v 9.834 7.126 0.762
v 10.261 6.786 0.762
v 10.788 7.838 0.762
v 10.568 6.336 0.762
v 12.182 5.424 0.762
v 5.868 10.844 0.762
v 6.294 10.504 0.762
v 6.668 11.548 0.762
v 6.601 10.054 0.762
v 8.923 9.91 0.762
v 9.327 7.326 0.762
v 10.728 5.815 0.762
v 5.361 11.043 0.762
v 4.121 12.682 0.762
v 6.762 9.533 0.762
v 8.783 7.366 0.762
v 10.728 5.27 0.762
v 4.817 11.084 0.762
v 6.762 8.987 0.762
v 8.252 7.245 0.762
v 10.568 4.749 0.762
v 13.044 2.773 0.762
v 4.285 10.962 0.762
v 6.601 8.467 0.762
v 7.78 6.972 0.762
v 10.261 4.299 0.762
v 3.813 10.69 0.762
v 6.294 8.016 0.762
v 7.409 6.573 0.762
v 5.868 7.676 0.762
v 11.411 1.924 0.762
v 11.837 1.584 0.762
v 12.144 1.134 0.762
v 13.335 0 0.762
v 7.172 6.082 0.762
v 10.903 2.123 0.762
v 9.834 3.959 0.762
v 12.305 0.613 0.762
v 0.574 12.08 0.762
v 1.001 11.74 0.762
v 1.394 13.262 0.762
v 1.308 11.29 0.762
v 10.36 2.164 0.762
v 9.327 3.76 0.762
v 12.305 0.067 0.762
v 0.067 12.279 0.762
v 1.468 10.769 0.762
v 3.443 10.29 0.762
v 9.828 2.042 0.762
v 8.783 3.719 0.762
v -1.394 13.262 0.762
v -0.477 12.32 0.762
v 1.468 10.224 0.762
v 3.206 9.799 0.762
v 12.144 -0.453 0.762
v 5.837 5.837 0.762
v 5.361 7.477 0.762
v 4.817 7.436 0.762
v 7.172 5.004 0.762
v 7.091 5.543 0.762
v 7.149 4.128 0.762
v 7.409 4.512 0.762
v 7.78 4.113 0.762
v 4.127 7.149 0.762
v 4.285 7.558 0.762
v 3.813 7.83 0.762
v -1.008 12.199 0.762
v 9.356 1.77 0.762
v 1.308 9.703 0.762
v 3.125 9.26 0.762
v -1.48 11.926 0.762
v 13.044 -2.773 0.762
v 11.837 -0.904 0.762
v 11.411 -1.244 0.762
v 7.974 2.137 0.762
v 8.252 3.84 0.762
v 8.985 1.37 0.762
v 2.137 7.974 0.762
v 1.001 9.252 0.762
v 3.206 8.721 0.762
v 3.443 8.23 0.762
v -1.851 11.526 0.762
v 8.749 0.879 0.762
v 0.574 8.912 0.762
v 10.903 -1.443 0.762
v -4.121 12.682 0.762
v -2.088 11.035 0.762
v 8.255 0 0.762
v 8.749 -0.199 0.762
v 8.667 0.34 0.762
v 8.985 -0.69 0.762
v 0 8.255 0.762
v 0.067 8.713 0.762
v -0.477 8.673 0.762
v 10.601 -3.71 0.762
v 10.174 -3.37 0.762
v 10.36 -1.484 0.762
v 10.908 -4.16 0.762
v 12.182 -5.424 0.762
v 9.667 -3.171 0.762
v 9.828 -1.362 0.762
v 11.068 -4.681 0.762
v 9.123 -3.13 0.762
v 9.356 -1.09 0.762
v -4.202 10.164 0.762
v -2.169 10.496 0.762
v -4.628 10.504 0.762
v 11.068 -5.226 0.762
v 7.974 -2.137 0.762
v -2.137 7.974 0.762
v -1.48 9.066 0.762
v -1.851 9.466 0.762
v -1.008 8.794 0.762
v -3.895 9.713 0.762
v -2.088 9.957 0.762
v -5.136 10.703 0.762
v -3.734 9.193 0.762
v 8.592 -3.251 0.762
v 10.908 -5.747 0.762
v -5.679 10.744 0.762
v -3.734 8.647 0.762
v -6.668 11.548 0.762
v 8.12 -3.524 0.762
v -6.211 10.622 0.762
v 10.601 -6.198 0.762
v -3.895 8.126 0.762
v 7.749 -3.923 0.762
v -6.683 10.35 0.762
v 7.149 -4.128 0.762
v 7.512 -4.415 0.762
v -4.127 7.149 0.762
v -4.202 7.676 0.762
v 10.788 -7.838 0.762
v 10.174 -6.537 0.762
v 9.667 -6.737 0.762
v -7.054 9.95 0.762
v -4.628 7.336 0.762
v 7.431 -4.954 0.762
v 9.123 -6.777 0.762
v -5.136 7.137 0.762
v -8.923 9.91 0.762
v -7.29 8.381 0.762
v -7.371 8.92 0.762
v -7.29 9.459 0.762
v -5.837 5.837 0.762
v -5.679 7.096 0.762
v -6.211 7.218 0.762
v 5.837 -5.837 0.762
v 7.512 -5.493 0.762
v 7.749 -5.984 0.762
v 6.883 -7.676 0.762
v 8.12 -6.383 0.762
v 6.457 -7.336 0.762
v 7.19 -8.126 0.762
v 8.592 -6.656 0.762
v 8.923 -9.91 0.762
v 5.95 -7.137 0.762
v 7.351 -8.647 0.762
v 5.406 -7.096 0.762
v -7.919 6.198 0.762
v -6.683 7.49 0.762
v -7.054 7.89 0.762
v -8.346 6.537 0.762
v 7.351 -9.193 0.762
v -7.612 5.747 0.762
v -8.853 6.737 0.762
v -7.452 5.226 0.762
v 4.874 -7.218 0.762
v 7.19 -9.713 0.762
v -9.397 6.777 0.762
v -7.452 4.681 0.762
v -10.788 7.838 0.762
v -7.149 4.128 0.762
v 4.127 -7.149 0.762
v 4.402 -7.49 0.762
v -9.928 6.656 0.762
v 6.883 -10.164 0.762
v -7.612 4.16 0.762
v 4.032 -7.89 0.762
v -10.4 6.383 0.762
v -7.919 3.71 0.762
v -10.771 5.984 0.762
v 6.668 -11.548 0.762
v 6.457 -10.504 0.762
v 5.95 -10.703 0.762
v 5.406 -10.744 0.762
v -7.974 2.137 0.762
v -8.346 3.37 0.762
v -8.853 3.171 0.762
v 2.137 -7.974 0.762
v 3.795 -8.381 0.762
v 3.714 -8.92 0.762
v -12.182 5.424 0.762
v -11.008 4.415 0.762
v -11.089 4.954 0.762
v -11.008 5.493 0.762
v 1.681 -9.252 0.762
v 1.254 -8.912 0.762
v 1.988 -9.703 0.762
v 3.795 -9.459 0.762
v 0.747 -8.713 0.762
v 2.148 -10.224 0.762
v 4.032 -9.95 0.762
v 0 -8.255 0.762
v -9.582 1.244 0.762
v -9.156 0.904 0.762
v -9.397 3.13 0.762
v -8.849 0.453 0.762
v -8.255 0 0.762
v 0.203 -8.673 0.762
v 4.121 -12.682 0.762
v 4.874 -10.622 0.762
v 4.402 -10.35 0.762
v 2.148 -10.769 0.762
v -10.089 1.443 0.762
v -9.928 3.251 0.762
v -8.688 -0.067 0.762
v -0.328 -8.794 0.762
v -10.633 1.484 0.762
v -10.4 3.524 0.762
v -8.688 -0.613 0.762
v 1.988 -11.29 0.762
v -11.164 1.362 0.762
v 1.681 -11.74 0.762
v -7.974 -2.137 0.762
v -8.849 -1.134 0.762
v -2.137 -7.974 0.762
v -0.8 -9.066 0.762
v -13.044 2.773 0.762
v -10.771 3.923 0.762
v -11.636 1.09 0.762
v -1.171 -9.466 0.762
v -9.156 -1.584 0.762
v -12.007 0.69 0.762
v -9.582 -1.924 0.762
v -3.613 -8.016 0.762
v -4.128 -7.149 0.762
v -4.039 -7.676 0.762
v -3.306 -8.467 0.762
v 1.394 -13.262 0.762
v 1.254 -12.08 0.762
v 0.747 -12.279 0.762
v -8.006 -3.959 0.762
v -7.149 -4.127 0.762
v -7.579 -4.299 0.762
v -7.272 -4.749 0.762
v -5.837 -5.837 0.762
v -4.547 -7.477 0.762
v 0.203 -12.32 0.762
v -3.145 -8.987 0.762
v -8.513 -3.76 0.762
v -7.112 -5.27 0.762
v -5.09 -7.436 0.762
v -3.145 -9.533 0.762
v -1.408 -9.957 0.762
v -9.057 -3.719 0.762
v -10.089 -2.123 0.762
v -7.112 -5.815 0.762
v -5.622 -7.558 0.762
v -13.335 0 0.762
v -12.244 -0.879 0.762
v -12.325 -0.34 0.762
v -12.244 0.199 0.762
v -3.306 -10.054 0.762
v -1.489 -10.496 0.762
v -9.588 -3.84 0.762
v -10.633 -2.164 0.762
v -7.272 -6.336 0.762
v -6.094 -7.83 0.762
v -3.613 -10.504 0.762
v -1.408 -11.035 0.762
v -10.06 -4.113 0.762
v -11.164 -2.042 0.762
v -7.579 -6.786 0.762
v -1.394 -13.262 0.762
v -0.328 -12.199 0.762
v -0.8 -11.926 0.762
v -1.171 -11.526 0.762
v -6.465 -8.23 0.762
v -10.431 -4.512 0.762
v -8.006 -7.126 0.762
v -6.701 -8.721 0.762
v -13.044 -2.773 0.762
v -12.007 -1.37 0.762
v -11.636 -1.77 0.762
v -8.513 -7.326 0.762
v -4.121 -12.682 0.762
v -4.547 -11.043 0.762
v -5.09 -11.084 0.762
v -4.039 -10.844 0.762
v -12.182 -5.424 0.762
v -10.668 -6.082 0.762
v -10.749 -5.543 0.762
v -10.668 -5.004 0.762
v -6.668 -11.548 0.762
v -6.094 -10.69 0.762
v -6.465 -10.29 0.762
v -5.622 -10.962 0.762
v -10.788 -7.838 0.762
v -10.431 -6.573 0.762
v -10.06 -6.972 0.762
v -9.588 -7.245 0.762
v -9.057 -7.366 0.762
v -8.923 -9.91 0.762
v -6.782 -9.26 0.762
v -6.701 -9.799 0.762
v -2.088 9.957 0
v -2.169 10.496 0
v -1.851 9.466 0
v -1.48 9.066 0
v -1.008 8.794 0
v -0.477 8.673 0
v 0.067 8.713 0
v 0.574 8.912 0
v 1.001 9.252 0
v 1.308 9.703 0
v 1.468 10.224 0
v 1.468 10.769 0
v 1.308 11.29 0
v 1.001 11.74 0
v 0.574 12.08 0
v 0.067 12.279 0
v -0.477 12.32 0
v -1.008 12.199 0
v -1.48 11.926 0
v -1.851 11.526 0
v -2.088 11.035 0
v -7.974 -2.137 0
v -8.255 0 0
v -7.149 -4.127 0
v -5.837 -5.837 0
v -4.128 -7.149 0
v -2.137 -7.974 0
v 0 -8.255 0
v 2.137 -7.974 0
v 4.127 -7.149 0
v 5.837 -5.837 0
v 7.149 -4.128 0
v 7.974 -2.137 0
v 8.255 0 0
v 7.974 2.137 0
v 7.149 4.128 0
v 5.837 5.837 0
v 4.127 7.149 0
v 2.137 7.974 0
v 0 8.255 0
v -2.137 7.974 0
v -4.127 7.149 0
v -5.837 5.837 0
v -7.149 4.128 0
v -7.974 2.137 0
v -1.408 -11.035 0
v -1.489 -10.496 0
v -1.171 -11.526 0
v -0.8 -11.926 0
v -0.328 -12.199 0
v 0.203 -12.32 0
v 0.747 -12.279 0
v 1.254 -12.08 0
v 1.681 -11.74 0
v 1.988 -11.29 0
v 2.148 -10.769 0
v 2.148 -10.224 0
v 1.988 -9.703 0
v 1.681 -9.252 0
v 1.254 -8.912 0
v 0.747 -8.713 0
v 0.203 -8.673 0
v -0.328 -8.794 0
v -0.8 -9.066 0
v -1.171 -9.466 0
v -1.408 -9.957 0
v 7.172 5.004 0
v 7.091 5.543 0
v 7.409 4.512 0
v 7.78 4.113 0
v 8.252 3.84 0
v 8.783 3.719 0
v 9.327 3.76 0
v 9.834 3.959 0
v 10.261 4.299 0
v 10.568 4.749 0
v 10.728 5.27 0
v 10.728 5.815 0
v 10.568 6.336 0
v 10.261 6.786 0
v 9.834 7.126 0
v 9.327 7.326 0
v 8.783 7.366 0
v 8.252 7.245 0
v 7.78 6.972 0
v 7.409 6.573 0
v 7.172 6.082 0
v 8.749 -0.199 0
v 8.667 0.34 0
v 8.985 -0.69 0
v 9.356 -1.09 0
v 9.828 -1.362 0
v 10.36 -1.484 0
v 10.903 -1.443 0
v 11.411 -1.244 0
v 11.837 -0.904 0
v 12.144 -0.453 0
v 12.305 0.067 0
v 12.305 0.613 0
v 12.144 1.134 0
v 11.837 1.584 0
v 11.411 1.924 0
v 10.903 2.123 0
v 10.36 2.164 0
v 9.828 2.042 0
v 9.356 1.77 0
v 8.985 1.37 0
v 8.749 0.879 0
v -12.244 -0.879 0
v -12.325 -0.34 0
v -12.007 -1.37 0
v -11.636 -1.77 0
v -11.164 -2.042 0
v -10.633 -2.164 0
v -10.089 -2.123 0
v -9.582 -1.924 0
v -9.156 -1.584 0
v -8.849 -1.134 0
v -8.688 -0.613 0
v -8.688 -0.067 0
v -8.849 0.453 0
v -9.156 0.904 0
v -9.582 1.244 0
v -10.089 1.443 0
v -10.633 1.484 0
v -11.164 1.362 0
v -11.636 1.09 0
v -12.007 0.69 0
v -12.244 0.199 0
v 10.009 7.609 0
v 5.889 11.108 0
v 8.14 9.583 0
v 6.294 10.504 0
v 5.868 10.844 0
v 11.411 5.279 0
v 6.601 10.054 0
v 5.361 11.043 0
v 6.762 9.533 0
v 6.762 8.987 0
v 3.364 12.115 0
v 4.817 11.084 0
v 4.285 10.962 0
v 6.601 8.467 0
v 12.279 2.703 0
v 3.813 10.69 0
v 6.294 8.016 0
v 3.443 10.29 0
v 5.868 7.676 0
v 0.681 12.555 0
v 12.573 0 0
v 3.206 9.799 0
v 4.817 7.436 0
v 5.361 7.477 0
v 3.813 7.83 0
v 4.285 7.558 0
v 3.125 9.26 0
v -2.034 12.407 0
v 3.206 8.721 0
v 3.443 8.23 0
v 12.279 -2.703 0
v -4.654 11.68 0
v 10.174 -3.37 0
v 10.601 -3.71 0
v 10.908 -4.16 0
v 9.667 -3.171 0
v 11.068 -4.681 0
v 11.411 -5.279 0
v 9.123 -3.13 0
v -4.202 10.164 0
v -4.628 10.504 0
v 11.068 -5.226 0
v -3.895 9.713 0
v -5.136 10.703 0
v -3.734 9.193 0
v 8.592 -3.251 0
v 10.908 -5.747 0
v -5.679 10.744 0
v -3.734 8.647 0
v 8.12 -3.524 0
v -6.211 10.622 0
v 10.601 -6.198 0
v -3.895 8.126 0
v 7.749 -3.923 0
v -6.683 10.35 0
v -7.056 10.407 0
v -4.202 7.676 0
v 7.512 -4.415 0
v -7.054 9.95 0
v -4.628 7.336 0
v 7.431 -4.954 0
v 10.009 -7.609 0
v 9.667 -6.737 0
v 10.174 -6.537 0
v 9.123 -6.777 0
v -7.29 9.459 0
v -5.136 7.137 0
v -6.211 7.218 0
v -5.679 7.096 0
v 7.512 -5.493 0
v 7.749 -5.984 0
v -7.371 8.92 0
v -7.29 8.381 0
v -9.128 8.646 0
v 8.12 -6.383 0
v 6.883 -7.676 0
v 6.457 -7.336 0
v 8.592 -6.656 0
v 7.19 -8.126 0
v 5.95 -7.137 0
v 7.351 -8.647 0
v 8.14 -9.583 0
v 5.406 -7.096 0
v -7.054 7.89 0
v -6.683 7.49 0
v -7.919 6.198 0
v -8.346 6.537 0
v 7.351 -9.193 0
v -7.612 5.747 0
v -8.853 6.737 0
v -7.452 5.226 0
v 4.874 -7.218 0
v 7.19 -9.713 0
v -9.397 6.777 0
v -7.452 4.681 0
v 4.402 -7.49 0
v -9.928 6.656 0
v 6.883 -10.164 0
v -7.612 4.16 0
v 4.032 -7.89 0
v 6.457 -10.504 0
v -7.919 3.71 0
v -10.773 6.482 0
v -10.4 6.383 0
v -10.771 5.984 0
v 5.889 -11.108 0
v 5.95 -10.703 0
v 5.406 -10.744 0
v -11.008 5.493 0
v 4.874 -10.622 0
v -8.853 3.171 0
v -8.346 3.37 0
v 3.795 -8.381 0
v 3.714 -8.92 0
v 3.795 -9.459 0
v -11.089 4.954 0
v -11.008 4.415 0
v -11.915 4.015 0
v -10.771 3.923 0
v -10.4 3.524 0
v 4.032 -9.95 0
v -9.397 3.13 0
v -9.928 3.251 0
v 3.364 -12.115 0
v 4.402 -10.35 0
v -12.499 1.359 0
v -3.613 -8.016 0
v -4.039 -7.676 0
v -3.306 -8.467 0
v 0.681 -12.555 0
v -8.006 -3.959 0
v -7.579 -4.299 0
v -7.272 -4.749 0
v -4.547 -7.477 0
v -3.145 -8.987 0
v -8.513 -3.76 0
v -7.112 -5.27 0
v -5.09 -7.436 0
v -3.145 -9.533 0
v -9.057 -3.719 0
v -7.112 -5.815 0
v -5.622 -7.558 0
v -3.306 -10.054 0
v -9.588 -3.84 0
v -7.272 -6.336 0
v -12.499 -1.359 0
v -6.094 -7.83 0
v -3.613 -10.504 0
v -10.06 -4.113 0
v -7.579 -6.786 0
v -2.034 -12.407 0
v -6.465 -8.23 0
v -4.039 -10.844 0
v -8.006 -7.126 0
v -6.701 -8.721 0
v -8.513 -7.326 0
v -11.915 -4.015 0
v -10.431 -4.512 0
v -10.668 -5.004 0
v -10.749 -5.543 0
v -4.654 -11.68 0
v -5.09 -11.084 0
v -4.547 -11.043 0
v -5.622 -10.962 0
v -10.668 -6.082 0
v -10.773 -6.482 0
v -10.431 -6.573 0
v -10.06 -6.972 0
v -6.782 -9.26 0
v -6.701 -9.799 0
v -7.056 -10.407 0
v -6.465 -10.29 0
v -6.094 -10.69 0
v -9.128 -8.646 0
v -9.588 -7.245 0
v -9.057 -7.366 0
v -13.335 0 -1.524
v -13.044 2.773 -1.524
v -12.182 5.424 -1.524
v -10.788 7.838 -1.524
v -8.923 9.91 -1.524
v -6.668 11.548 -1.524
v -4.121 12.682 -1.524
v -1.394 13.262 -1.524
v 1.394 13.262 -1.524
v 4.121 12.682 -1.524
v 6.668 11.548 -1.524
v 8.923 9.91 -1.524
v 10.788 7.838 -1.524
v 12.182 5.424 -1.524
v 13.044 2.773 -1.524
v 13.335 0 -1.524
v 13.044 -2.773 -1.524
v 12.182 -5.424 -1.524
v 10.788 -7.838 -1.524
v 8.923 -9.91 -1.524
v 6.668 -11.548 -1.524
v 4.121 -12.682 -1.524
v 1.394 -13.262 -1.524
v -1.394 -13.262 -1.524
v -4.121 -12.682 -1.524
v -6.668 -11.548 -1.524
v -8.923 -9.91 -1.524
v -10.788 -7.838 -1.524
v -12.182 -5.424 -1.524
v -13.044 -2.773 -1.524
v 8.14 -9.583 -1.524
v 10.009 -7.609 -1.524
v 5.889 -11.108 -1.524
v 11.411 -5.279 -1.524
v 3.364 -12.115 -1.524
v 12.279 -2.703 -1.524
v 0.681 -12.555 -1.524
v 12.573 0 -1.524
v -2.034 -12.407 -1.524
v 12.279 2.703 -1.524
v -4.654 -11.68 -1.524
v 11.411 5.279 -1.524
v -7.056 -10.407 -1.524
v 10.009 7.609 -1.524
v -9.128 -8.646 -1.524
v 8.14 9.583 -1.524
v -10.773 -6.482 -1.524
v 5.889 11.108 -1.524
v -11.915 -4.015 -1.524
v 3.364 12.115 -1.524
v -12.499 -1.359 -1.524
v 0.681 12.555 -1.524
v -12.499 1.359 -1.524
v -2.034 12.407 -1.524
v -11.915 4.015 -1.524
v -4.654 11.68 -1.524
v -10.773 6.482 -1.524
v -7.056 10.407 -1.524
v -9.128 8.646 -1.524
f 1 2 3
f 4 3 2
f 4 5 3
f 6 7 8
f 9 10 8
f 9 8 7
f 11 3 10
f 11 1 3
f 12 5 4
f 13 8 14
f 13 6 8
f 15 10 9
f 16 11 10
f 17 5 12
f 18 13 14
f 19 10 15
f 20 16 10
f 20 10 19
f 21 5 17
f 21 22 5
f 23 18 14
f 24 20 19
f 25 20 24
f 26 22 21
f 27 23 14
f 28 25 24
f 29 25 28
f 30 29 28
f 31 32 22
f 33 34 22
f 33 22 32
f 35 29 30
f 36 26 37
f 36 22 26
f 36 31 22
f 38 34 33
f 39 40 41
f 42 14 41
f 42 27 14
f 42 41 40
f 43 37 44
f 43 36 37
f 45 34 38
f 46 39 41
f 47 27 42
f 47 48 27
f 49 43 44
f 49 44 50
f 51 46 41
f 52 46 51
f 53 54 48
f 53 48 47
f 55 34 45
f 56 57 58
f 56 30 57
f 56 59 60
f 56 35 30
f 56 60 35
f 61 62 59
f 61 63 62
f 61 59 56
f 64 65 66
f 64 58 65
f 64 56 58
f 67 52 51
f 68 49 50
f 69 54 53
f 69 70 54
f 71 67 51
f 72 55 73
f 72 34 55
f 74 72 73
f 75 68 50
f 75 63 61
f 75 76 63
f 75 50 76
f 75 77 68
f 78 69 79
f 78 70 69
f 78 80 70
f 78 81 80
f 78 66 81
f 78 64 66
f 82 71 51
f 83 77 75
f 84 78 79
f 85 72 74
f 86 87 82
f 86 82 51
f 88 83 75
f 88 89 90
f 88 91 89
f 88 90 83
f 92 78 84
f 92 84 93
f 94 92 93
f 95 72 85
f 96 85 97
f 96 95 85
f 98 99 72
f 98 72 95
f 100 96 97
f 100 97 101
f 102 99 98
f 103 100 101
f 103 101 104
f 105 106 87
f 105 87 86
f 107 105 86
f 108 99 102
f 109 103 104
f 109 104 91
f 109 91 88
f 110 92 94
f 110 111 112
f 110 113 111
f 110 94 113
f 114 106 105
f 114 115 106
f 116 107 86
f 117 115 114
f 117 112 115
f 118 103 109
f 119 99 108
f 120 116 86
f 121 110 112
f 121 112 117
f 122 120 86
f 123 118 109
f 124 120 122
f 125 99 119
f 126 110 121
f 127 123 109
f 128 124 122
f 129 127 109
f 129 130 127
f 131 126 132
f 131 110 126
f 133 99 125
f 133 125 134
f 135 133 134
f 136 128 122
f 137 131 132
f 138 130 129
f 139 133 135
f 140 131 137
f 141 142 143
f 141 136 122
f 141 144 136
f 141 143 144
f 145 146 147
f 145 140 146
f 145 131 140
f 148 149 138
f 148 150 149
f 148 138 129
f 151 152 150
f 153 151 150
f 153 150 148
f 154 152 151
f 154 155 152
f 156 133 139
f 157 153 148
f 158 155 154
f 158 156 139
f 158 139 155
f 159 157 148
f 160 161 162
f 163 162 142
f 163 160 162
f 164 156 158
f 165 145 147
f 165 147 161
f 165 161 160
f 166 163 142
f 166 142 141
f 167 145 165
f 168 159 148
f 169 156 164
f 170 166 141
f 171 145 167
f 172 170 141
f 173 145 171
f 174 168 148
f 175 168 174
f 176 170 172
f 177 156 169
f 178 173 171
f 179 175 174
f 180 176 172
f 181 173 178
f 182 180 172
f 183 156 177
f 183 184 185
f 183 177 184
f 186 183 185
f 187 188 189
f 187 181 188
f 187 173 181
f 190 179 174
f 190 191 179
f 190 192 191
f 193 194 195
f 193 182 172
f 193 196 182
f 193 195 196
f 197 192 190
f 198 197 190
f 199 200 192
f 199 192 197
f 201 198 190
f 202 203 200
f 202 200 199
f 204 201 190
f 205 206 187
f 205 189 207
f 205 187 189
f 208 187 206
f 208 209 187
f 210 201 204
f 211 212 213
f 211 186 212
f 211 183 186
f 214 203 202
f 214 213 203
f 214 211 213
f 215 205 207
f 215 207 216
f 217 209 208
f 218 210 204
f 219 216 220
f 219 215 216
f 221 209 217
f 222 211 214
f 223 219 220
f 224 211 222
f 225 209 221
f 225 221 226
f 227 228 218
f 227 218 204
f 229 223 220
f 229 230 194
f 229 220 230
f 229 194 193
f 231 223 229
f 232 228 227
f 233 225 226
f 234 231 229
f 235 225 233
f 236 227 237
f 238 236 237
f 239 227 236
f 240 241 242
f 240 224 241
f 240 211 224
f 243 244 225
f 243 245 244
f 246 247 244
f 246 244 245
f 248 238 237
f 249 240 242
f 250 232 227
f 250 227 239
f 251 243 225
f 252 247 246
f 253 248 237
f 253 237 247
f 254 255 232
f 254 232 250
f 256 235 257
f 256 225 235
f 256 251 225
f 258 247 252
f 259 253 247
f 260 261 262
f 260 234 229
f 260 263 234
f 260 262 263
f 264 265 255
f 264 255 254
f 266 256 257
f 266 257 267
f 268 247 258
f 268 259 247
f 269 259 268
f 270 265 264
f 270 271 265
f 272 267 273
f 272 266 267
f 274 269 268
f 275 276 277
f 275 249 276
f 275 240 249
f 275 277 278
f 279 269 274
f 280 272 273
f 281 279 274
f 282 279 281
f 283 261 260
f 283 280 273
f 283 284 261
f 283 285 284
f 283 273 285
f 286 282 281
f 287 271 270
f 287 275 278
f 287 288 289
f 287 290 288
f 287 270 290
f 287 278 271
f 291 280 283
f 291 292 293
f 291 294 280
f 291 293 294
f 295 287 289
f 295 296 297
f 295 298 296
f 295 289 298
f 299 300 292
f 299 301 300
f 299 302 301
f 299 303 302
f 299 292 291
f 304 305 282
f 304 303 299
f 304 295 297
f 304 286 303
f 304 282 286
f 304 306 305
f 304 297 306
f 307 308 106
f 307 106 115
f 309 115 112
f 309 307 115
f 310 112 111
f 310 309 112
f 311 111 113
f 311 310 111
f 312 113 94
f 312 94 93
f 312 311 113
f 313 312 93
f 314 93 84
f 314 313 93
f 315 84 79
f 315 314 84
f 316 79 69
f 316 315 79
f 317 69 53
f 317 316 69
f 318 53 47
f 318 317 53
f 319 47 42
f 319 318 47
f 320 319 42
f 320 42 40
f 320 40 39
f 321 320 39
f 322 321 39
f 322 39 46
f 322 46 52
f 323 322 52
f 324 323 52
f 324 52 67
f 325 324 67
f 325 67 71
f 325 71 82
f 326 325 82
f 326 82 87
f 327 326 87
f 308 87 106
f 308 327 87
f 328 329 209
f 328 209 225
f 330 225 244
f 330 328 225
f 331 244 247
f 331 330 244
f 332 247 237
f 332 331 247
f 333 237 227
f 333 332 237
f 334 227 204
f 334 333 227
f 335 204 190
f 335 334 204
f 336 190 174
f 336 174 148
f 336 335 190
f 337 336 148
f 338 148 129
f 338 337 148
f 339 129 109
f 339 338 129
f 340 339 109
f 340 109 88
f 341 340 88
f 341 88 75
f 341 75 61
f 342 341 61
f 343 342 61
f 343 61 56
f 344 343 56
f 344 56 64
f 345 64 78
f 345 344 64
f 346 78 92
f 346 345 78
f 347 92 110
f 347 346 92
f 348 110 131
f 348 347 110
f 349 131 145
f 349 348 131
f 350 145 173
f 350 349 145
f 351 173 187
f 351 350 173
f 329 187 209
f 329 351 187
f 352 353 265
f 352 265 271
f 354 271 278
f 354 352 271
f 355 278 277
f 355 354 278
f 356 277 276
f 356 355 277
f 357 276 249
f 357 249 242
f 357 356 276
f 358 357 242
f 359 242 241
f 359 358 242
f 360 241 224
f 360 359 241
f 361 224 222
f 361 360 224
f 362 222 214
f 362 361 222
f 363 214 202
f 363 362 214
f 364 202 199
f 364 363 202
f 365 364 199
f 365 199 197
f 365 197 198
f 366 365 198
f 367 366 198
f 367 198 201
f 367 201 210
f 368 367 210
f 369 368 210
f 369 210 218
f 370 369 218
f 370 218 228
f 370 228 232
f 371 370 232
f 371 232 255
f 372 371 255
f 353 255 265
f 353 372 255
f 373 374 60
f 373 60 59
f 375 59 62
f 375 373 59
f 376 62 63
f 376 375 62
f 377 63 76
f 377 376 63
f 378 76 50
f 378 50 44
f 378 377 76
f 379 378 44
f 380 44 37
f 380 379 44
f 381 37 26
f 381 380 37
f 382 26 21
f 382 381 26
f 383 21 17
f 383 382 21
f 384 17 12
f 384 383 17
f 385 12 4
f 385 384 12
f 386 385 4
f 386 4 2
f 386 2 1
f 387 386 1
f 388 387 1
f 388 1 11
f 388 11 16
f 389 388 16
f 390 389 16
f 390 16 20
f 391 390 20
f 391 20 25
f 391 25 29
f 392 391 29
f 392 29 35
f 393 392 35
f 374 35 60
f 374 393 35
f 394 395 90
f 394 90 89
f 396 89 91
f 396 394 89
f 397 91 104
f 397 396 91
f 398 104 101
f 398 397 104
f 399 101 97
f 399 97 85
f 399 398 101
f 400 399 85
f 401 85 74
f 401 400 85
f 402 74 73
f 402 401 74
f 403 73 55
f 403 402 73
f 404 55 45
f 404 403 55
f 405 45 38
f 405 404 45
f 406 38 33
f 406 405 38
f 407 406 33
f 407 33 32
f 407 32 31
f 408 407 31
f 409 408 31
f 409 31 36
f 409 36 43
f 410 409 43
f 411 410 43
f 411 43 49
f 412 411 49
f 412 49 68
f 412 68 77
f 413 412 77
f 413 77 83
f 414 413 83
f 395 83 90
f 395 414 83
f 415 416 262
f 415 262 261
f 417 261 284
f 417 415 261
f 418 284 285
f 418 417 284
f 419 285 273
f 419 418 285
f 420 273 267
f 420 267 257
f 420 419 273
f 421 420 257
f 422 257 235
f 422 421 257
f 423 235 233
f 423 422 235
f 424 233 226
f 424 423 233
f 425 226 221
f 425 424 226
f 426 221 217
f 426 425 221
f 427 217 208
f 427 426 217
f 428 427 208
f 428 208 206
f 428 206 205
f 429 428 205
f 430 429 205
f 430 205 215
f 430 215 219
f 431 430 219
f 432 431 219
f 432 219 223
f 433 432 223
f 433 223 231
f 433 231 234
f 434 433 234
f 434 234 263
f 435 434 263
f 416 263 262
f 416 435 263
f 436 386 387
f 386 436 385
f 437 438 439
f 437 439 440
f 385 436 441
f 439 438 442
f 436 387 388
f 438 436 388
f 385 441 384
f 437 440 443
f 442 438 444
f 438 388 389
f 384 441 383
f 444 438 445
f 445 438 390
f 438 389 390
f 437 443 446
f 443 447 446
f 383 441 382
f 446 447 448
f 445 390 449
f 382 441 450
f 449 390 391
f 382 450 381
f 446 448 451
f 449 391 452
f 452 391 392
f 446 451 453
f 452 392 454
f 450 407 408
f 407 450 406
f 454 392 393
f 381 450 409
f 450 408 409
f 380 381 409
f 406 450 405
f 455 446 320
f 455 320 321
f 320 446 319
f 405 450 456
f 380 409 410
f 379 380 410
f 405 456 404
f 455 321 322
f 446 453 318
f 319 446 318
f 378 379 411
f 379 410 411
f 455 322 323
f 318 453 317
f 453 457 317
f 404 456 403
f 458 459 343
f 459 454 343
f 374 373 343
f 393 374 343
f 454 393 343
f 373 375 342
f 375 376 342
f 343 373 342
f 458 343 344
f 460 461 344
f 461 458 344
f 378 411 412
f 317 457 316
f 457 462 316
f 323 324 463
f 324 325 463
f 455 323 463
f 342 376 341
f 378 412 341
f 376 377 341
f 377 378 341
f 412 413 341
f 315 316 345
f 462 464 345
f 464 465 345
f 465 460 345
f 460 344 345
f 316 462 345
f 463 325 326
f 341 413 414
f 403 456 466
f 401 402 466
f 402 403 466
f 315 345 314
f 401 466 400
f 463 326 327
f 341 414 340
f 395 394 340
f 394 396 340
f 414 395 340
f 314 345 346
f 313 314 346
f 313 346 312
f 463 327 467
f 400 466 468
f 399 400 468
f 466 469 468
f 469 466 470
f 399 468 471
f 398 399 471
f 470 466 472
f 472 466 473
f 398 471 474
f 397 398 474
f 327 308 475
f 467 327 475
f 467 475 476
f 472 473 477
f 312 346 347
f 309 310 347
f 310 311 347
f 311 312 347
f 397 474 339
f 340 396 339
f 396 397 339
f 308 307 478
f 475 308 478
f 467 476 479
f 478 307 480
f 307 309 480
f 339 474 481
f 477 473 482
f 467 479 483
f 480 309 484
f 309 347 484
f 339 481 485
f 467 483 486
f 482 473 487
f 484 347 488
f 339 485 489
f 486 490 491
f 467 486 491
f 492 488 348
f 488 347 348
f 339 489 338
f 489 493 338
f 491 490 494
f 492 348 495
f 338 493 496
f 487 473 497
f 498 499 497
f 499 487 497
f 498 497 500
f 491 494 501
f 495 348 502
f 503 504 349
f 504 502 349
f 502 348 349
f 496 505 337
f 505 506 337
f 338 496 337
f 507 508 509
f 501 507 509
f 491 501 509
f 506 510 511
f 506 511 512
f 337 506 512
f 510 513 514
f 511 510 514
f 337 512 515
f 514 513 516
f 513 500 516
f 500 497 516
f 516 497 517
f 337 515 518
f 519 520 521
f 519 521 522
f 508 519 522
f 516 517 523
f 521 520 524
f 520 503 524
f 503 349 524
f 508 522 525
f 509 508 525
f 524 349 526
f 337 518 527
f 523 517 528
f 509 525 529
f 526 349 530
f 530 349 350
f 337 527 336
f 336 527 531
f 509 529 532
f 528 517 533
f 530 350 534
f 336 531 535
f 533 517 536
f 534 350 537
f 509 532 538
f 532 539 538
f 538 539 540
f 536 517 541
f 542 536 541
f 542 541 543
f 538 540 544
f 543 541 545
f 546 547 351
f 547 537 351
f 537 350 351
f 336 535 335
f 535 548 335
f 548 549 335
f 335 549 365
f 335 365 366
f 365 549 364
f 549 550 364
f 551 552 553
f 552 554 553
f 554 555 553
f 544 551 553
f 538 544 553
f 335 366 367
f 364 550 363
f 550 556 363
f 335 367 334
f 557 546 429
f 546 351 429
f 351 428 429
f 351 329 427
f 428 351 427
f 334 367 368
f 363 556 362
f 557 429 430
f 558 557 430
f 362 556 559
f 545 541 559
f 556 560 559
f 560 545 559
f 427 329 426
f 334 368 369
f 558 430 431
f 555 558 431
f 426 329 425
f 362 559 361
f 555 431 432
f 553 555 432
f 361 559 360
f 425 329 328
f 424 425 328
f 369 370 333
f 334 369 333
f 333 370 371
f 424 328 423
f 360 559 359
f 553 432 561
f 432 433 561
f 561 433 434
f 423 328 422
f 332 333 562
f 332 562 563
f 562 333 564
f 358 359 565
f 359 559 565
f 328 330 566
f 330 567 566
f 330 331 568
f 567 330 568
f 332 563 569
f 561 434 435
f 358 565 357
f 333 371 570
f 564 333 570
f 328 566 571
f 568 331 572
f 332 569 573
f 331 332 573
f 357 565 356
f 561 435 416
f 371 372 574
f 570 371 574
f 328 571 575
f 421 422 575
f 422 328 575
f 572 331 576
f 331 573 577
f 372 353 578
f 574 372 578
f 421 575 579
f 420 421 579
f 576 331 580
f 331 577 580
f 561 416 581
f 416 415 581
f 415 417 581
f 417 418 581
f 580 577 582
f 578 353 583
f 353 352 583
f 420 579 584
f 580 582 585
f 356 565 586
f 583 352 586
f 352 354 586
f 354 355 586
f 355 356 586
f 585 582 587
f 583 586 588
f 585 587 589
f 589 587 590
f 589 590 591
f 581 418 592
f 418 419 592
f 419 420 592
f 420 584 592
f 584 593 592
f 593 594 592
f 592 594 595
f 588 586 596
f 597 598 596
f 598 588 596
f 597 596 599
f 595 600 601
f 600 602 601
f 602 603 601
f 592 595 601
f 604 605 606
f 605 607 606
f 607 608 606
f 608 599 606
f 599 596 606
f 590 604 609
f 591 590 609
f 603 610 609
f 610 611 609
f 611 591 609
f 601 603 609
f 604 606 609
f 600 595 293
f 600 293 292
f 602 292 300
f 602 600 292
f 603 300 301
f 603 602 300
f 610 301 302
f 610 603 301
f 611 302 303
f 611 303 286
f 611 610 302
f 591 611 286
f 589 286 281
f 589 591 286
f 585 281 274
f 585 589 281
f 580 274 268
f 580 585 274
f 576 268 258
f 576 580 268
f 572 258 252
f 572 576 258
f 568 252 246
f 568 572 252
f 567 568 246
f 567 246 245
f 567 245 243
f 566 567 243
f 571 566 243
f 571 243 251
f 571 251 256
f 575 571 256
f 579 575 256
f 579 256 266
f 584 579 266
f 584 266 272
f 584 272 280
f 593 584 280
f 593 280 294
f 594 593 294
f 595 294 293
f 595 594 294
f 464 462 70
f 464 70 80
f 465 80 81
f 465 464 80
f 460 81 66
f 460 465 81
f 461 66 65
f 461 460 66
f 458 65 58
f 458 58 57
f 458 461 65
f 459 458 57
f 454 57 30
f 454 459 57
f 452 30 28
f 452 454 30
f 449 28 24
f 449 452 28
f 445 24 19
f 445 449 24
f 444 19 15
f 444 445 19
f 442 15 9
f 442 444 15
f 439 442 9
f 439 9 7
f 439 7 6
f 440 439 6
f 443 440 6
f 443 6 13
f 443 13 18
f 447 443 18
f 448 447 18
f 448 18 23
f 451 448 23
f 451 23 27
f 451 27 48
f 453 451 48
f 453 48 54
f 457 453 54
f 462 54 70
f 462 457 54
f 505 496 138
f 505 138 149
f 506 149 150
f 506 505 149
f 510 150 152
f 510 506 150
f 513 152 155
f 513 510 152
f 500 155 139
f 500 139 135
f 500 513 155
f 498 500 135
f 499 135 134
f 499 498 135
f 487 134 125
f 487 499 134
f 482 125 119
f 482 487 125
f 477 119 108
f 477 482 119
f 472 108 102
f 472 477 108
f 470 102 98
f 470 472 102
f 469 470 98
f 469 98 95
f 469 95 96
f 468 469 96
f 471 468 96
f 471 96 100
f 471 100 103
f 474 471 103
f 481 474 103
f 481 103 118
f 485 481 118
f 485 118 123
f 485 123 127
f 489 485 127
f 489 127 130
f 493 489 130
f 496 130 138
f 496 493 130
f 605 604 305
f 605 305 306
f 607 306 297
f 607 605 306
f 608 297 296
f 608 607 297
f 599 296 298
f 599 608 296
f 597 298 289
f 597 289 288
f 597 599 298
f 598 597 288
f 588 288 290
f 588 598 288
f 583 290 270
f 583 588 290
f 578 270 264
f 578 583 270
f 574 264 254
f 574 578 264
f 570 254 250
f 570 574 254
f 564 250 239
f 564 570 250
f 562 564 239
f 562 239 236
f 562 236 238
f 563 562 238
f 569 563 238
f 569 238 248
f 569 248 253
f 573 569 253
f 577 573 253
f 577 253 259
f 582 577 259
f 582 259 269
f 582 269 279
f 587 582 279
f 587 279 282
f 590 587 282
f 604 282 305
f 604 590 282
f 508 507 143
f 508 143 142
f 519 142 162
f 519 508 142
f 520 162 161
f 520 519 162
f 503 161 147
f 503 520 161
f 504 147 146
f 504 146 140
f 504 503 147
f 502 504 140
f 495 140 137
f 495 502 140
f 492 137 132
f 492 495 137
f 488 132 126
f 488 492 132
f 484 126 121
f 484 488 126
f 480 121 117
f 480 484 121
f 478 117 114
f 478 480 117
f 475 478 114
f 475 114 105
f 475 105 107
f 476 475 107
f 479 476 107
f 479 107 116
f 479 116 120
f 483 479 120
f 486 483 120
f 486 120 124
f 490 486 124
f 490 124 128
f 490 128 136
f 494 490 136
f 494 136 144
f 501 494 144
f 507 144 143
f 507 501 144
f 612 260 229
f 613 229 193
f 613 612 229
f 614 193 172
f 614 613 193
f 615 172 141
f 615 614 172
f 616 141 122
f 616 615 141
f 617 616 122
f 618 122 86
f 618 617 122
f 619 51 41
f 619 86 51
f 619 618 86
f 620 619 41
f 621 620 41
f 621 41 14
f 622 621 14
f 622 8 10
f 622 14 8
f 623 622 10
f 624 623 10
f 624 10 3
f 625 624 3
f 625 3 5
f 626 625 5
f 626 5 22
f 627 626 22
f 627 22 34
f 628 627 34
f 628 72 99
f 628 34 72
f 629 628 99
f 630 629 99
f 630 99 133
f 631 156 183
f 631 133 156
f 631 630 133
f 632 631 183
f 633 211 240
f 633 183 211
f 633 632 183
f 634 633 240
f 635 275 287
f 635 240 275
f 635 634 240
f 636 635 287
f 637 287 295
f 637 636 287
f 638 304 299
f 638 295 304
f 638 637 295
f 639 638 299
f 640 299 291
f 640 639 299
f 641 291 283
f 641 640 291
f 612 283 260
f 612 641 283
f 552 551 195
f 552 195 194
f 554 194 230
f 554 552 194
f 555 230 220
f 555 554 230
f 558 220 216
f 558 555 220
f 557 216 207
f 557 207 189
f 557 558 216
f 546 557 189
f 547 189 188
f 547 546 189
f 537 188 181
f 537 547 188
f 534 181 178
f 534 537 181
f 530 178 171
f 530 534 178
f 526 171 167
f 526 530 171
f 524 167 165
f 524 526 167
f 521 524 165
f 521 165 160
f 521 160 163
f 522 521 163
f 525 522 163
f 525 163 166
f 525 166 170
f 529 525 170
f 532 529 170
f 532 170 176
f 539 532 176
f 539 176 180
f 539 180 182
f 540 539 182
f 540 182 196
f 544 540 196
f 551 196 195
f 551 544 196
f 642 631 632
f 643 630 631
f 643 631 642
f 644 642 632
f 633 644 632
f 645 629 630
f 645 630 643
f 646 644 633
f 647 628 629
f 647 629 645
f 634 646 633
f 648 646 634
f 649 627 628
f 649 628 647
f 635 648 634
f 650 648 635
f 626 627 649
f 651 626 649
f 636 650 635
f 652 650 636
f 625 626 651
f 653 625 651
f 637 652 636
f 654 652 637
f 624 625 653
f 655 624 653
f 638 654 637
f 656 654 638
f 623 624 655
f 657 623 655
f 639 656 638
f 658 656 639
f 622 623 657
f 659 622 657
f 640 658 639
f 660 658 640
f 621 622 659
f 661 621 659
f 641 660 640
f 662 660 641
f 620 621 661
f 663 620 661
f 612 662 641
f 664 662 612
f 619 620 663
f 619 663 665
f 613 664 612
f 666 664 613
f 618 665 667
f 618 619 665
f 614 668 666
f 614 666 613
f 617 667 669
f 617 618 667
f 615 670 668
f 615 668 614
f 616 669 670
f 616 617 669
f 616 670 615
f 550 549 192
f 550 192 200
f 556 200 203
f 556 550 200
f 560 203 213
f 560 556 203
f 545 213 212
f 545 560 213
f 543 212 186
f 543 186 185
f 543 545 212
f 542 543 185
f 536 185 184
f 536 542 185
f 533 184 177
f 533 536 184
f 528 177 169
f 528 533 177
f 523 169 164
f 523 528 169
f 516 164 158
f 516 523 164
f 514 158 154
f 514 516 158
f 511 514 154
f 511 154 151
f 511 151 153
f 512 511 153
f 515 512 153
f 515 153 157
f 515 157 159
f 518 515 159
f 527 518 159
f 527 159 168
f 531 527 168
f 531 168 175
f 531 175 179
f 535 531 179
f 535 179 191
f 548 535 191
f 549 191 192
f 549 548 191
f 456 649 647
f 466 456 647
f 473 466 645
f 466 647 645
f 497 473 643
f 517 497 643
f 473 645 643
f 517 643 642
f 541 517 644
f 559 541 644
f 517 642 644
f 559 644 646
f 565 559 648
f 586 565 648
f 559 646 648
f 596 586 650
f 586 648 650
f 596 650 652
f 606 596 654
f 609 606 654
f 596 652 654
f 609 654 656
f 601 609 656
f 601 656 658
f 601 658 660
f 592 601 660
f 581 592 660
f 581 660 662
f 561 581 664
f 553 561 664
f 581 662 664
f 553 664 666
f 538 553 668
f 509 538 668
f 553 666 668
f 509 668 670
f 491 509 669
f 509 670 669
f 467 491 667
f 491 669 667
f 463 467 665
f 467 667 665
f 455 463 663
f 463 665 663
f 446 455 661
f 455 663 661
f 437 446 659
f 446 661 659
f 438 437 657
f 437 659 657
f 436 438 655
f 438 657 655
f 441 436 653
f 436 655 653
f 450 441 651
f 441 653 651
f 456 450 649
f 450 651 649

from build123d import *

# Parameters (mm, degrees)
SKETCH1_R           = 13.335
SKETCH1_R_2         = 8.255
SKETCH1_R_3         = 1.8288
BOSS_EXTRUDE1_DEPTH = 0.762
BOSS_EXTRUDE2_START = 1.524
SKETCH2_R           = 13.335
SKETCH2_R_2         = 12.573
BOSS_EXTRUDE2_DEPTH = 1.524


with BuildPart() as part:
    # Sketch1 → Boss-Extrude1 (new body)
    with BuildSketch(Plane.XY):
        with Locations(Location((0, 0, 0), (0, 0, 180))):
            Circle(SKETCH1_R)
        with Locations(Location((0, 0, 0), (0, 0, 180))):
            Circle(SKETCH1_R_2, mode=Mode.SUBTRACT)
        with Locations(Location((8.919971224, 5.542595082, 0), (0, 0, 180))):
            Circle(SKETCH1_R_3, mode=Mode.SUBTRACT)
        with Locations(Location((10.496219222, 0.340042532, 0), (0, 0, 180))):
            Circle(SKETCH1_R_3, mode=Mode.SUBTRACT)
        with Locations(Location((9.260013756, -4.95362414, 0), (0, 0, 180))):
            Circle(SKETCH1_R_3, mode=Mode.SUBTRACT)
        with Locations(Location((5.542595082, -8.919971224, 0), (0, 0, 180))):
            Circle(SKETCH1_R_3, mode=Mode.SUBTRACT)
        with Locations(Location((0.340042532, -10.496219222, 0), (0, 0, 180))):
            Circle(SKETCH1_R_3, mode=Mode.SUBTRACT)
        with Locations(Location((-4.95362414, -9.260013756, 0), (0, 0, 180))):
            Circle(SKETCH1_R_3, mode=Mode.SUBTRACT)
        with Locations(Location((-8.919971224, -5.542595082, 0), (0, 0, 180))):
            Circle(SKETCH1_R_3, mode=Mode.SUBTRACT)
        with Locations(Location((-10.496219222, -0.340042532, 0), (0, 0, 180))):
            Circle(SKETCH1_R_3, mode=Mode.SUBTRACT)
        with Locations(Location((-9.260013756, 4.95362414, 0), (0, 0, 180))):
            Circle(SKETCH1_R_3, mode=Mode.SUBTRACT)
        with Locations(Location((-5.542595082, 8.919971224, 0), (0, 0, 180))):
            Circle(SKETCH1_R_3, mode=Mode.SUBTRACT)
        with Locations(Location((-0.340042532, 10.496219222, 0), (0, 0, 180))):
            Circle(SKETCH1_R_3, mode=Mode.SUBTRACT)
        with Locations(Location((4.95362414, 9.260013756, 0), (0, 0, 180))):
            Circle(SKETCH1_R_3, mode=Mode.SUBTRACT)
    extrude(amount=BOSS_EXTRUDE1_DEPTH)

    # Sketch2 → Boss-Extrude2 (add)
    with BuildSketch(Plane(origin=(0, 0, 0), x_dir=(-1, 0, 0), z_dir=(0, 0, -1)).offset(BOSS_EXTRUDE2_START)):
        Circle(SKETCH2_R)
        with Locations(Location((0, 0, 0), (0, 0, 180))):
            Circle(SKETCH2_R_2, mode=Mode.SUBTRACT)
    extrude(amount=-BOSS_EXTRUDE2_DEPTH)


solid = part.part
